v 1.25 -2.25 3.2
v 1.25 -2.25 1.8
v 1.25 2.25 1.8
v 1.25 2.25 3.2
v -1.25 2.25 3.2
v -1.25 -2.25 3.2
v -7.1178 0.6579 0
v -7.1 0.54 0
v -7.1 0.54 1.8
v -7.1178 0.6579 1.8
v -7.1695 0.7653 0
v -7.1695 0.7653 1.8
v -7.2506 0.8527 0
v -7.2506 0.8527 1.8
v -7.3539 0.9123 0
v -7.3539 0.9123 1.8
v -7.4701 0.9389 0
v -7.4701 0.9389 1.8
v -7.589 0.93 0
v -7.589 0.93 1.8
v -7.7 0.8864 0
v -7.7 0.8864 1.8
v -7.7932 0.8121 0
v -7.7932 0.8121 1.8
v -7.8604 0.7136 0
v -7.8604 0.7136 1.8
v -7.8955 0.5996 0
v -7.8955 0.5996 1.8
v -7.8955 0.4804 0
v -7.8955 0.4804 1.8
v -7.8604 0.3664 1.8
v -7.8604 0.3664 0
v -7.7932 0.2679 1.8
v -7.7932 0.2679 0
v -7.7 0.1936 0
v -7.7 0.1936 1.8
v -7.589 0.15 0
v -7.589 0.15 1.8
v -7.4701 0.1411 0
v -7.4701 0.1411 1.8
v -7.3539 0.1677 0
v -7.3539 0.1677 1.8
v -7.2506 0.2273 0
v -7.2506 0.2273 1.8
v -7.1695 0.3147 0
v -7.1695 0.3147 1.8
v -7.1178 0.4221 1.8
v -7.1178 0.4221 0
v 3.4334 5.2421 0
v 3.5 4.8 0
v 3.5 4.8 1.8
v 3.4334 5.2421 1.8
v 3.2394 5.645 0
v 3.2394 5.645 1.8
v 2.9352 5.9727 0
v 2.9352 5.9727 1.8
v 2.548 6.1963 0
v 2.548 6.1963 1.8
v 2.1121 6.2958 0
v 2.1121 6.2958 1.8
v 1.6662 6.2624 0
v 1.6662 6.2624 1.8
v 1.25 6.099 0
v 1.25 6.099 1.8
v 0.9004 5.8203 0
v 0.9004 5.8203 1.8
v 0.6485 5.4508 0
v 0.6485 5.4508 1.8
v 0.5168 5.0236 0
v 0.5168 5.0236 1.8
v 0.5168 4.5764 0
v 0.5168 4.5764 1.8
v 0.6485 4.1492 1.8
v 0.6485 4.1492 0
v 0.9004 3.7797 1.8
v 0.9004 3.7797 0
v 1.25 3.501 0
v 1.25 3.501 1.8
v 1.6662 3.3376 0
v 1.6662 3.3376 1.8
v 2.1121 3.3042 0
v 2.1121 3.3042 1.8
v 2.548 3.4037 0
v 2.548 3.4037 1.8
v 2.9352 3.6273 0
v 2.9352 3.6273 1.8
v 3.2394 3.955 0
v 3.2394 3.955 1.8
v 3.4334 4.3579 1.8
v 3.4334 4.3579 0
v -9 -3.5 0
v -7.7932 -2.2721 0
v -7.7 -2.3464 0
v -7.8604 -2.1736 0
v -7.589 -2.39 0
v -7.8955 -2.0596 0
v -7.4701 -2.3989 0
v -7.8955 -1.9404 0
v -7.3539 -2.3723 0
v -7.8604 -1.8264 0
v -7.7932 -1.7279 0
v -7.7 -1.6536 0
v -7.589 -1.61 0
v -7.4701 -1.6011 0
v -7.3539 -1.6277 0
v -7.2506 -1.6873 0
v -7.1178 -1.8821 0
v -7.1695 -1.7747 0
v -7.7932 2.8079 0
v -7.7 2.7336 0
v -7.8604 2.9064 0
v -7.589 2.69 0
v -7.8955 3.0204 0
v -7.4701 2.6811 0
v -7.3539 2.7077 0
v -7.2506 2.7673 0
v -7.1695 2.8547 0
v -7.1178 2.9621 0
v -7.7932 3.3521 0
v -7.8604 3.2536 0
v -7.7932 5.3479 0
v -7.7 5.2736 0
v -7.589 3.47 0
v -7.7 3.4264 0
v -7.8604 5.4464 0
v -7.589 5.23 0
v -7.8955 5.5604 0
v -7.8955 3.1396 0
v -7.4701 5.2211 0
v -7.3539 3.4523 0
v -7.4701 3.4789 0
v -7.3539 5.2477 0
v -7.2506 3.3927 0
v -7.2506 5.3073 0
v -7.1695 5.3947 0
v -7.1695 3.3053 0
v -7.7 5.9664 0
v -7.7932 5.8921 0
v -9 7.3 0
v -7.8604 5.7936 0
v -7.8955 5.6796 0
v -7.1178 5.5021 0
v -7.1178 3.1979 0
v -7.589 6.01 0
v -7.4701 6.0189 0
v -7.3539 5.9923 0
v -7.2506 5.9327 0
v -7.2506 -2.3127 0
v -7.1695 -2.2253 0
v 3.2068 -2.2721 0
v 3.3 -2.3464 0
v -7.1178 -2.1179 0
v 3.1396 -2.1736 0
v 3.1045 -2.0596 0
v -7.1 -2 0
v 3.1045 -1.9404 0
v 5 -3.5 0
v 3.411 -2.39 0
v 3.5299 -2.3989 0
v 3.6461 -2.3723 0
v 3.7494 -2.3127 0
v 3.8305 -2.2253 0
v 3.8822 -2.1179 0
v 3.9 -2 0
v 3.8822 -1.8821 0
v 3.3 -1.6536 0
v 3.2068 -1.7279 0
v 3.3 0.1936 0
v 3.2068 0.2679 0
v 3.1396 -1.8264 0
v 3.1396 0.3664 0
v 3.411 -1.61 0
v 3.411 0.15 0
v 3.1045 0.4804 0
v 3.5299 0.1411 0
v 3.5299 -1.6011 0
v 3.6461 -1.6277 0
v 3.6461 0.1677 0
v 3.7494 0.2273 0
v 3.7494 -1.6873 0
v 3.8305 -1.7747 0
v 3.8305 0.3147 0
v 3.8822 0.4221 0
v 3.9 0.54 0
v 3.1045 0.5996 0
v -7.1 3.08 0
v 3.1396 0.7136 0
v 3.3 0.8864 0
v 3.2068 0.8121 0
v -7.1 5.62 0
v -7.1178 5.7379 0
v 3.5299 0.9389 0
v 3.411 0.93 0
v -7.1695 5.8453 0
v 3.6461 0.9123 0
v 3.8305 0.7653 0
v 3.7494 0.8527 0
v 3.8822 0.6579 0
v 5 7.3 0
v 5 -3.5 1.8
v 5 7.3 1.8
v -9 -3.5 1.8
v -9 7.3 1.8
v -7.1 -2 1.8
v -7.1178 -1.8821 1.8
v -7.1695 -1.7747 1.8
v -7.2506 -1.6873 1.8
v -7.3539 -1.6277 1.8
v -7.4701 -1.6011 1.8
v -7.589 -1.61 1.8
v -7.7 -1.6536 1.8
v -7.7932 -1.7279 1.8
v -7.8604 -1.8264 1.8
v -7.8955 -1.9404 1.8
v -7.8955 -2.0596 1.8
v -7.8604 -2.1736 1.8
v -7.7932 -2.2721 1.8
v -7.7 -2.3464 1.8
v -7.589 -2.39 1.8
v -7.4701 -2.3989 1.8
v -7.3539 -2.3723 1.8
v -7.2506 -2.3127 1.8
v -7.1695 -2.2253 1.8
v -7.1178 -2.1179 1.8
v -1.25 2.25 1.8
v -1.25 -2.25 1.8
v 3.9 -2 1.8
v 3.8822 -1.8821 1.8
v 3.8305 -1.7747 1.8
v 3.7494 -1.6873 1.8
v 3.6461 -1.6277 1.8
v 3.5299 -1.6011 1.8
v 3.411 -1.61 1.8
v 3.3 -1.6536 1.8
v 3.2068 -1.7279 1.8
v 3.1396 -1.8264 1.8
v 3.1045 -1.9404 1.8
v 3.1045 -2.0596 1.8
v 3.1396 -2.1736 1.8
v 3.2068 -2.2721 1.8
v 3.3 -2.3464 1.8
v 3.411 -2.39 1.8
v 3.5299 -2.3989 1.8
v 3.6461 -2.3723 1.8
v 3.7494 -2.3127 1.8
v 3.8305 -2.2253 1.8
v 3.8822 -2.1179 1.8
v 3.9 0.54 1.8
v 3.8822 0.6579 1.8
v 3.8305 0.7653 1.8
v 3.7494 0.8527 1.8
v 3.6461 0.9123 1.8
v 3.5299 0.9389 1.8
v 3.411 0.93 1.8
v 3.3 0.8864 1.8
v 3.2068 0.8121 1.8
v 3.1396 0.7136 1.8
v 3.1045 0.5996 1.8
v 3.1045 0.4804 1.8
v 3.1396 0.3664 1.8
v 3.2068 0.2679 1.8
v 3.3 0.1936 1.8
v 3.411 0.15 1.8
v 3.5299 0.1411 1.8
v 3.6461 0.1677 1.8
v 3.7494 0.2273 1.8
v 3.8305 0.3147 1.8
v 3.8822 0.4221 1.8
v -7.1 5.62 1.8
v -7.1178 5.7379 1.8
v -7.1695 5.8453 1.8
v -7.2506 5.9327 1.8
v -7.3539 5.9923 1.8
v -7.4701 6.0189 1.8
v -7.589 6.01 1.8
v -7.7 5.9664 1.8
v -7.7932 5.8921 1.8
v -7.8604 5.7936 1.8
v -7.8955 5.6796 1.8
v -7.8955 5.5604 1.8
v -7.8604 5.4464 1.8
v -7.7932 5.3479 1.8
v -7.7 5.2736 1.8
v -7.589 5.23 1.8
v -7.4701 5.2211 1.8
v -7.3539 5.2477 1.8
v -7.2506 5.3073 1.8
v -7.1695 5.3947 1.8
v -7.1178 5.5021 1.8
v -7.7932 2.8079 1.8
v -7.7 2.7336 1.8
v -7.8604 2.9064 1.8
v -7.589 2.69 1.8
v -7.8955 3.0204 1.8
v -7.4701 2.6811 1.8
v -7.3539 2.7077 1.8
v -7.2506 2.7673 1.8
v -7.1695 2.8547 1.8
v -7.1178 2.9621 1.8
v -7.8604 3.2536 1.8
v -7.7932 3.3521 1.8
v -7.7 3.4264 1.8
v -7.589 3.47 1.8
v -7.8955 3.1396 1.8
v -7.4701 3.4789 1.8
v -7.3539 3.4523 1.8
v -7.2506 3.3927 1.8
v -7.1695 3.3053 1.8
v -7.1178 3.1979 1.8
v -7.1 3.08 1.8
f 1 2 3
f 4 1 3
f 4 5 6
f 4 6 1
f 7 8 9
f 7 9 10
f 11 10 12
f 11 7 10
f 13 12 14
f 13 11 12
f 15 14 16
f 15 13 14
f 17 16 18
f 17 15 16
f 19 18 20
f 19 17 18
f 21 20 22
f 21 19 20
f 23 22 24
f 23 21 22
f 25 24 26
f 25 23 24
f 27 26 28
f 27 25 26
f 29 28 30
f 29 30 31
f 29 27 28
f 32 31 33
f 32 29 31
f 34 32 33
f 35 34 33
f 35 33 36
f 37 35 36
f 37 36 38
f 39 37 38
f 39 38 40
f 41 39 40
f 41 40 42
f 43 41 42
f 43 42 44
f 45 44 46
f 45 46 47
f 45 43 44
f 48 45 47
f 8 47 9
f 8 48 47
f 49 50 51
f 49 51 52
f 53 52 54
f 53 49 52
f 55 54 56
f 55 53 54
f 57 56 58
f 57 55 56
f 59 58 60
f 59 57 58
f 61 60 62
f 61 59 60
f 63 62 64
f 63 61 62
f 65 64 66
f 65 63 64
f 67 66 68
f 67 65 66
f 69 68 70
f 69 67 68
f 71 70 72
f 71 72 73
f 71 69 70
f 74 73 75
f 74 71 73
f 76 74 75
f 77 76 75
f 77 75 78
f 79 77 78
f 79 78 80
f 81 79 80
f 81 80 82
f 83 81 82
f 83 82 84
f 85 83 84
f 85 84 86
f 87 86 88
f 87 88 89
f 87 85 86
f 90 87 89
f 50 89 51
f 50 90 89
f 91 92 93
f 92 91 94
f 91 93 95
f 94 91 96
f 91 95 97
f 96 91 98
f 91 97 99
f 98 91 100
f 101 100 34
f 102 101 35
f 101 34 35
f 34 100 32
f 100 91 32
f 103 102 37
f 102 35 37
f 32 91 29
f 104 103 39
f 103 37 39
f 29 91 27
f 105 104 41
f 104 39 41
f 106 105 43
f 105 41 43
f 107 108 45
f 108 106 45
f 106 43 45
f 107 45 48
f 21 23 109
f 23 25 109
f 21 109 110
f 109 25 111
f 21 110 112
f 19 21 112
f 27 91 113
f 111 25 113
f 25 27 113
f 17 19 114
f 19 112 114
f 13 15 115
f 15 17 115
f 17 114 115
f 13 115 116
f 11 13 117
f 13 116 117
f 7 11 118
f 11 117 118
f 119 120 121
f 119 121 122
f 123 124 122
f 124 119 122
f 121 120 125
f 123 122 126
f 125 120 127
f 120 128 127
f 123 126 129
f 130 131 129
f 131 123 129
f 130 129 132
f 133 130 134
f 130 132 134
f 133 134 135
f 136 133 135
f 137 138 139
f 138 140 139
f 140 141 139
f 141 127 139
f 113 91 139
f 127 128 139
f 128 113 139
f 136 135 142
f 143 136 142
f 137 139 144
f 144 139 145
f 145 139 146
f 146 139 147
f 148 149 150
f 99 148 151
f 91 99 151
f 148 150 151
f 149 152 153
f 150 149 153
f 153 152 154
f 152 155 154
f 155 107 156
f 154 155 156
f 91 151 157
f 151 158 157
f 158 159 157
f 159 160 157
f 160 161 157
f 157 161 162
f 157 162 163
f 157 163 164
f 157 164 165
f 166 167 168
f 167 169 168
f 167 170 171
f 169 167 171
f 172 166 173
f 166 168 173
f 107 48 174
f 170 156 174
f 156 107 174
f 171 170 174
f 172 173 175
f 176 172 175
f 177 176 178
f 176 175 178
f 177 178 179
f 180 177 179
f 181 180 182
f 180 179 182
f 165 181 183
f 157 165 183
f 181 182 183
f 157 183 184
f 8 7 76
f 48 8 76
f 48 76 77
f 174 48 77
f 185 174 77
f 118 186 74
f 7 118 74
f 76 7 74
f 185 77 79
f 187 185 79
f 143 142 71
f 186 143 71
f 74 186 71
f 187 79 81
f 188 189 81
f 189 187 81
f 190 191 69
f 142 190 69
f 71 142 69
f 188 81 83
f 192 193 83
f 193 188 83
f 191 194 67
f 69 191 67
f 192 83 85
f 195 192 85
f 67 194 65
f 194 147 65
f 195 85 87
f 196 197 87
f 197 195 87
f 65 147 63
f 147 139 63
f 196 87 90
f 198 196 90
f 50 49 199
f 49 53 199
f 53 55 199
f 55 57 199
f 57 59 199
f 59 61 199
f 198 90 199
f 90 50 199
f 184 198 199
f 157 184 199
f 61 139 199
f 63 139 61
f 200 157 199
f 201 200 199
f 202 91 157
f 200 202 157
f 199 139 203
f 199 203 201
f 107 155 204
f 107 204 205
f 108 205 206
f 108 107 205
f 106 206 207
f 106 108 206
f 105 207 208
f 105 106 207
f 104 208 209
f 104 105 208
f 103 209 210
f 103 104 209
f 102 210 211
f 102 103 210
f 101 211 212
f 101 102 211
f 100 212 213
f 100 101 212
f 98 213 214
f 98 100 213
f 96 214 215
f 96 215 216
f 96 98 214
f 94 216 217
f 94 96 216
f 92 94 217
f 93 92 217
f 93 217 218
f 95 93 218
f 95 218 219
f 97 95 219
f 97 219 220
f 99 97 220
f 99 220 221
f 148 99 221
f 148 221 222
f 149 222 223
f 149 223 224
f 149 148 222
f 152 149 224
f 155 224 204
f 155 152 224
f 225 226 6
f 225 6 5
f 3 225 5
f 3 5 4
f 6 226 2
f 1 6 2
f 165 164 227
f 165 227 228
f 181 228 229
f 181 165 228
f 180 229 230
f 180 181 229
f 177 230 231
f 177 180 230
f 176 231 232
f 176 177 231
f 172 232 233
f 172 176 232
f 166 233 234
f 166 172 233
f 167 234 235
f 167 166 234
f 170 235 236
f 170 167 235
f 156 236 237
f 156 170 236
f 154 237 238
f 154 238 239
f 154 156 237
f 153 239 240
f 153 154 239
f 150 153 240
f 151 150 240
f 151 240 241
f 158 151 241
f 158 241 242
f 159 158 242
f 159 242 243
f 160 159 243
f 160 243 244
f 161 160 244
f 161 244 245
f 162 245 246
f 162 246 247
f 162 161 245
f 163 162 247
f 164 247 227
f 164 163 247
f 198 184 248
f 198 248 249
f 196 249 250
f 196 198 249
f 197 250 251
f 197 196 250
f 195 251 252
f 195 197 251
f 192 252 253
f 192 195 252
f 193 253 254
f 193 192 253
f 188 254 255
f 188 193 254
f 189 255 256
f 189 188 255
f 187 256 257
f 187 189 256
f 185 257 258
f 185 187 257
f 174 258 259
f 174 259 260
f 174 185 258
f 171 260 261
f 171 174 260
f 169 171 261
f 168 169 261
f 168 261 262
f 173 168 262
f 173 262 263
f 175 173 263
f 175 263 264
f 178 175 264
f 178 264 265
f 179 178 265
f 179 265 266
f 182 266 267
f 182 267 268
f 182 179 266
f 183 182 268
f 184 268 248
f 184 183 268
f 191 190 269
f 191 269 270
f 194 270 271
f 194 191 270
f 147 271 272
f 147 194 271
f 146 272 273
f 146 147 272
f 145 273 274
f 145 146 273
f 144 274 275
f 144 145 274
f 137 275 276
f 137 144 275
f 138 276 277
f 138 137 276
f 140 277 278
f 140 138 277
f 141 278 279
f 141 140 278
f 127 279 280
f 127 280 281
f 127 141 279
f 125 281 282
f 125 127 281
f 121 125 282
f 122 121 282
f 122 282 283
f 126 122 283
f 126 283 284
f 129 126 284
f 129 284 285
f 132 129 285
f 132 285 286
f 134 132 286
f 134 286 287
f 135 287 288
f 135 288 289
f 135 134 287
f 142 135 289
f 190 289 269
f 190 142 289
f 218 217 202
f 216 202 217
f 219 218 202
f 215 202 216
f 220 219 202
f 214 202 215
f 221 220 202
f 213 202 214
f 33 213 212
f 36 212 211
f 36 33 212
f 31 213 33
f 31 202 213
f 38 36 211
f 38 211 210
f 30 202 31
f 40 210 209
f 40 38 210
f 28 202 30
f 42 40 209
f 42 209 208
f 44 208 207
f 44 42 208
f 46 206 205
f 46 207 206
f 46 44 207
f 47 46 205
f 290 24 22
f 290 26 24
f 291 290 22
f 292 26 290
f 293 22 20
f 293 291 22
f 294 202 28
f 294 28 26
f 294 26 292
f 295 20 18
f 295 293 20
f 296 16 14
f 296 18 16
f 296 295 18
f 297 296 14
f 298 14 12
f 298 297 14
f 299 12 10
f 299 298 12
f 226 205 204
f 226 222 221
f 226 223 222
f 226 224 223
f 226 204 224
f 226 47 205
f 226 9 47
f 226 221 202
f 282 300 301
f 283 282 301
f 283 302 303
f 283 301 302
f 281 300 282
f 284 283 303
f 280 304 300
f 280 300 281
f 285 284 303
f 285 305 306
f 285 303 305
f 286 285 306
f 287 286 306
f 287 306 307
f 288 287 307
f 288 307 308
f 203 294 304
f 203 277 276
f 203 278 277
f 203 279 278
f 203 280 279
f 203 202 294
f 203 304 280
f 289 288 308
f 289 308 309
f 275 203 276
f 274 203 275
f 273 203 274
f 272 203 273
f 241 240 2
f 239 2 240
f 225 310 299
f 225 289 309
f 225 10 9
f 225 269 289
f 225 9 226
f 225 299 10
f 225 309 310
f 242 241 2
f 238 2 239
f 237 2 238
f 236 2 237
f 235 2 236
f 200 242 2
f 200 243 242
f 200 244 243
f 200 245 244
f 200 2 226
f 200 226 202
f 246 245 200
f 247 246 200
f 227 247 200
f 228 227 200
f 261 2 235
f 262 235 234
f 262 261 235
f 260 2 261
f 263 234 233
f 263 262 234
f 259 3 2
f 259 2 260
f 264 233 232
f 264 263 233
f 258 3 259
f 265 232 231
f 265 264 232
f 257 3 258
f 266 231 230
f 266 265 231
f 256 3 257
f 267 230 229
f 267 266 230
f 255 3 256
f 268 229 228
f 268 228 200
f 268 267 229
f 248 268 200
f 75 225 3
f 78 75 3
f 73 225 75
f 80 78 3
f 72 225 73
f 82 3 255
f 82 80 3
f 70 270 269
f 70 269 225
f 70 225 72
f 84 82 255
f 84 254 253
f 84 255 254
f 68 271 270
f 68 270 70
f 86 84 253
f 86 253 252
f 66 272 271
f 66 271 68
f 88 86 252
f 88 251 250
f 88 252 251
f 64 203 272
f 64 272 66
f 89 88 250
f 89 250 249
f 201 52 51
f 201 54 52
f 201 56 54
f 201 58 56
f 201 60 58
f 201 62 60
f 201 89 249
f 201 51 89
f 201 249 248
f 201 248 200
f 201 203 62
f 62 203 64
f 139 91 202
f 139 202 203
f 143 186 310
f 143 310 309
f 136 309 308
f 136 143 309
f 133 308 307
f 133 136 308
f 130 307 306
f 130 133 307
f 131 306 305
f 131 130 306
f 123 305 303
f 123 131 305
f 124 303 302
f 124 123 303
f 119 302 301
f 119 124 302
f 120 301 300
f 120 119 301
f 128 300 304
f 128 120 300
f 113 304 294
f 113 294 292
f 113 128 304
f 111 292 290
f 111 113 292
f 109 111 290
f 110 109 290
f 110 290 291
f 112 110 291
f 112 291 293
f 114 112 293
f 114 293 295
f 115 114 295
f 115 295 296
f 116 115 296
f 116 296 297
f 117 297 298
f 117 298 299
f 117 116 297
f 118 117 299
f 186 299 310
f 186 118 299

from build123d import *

# Parameters (mm, degrees)
SKETCH_W     = 14
SKETCH_H     = 10.8
SKETCH_R     = 1.5
SKETCH_R_2   = 0.4
PAD_DEPTH    = 1.8
SKETCH001_W  = 2.5
SKETCH001_H  = 4.5
PAD001_DEPTH = 1.4


with BuildPart() as part:
    # Sketch → Pad (new body)
    with BuildSketch(Plane.XY):
        with Locations((-2, 1.9)):
            Rectangle(SKETCH_W, SKETCH_H)
        with Locations((2, 4.8)):
            Circle(SKETCH_R, mode=Mode.SUBTRACT)
        with Locations((3.5, 0.54)):
            Circle(SKETCH_R_2, mode=Mode.SUBTRACT)
        with Locations((3.5, -2)):
            Circle(SKETCH_R_2, mode=Mode.SUBTRACT)
        with Locations((-7.5, 5.62)):
            Circle(SKETCH_R_2, mode=Mode.SUBTRACT)
        with Locations((-7.5, 3.08)):
            Circle(SKETCH_R_2, mode=Mode.SUBTRACT)
        with Locations((-7.5, 0.54)):
            Circle(SKETCH_R_2, mode=Mode.SUBTRACT)
        with Locations((-7.5, -2)):
            Circle(SKETCH_R_2, mode=Mode.SUBTRACT)
    extrude(amount=PAD_DEPTH)

    # Sketch001 (on Face13 of Pad) → Pad001 (join)
    with BuildSketch(Plane.XY.offset(1.8)):
        Rectangle(SKETCH001_W, SKETCH001_H)
    extrude(amount=PAD001_DEPTH)


solid = part.part
